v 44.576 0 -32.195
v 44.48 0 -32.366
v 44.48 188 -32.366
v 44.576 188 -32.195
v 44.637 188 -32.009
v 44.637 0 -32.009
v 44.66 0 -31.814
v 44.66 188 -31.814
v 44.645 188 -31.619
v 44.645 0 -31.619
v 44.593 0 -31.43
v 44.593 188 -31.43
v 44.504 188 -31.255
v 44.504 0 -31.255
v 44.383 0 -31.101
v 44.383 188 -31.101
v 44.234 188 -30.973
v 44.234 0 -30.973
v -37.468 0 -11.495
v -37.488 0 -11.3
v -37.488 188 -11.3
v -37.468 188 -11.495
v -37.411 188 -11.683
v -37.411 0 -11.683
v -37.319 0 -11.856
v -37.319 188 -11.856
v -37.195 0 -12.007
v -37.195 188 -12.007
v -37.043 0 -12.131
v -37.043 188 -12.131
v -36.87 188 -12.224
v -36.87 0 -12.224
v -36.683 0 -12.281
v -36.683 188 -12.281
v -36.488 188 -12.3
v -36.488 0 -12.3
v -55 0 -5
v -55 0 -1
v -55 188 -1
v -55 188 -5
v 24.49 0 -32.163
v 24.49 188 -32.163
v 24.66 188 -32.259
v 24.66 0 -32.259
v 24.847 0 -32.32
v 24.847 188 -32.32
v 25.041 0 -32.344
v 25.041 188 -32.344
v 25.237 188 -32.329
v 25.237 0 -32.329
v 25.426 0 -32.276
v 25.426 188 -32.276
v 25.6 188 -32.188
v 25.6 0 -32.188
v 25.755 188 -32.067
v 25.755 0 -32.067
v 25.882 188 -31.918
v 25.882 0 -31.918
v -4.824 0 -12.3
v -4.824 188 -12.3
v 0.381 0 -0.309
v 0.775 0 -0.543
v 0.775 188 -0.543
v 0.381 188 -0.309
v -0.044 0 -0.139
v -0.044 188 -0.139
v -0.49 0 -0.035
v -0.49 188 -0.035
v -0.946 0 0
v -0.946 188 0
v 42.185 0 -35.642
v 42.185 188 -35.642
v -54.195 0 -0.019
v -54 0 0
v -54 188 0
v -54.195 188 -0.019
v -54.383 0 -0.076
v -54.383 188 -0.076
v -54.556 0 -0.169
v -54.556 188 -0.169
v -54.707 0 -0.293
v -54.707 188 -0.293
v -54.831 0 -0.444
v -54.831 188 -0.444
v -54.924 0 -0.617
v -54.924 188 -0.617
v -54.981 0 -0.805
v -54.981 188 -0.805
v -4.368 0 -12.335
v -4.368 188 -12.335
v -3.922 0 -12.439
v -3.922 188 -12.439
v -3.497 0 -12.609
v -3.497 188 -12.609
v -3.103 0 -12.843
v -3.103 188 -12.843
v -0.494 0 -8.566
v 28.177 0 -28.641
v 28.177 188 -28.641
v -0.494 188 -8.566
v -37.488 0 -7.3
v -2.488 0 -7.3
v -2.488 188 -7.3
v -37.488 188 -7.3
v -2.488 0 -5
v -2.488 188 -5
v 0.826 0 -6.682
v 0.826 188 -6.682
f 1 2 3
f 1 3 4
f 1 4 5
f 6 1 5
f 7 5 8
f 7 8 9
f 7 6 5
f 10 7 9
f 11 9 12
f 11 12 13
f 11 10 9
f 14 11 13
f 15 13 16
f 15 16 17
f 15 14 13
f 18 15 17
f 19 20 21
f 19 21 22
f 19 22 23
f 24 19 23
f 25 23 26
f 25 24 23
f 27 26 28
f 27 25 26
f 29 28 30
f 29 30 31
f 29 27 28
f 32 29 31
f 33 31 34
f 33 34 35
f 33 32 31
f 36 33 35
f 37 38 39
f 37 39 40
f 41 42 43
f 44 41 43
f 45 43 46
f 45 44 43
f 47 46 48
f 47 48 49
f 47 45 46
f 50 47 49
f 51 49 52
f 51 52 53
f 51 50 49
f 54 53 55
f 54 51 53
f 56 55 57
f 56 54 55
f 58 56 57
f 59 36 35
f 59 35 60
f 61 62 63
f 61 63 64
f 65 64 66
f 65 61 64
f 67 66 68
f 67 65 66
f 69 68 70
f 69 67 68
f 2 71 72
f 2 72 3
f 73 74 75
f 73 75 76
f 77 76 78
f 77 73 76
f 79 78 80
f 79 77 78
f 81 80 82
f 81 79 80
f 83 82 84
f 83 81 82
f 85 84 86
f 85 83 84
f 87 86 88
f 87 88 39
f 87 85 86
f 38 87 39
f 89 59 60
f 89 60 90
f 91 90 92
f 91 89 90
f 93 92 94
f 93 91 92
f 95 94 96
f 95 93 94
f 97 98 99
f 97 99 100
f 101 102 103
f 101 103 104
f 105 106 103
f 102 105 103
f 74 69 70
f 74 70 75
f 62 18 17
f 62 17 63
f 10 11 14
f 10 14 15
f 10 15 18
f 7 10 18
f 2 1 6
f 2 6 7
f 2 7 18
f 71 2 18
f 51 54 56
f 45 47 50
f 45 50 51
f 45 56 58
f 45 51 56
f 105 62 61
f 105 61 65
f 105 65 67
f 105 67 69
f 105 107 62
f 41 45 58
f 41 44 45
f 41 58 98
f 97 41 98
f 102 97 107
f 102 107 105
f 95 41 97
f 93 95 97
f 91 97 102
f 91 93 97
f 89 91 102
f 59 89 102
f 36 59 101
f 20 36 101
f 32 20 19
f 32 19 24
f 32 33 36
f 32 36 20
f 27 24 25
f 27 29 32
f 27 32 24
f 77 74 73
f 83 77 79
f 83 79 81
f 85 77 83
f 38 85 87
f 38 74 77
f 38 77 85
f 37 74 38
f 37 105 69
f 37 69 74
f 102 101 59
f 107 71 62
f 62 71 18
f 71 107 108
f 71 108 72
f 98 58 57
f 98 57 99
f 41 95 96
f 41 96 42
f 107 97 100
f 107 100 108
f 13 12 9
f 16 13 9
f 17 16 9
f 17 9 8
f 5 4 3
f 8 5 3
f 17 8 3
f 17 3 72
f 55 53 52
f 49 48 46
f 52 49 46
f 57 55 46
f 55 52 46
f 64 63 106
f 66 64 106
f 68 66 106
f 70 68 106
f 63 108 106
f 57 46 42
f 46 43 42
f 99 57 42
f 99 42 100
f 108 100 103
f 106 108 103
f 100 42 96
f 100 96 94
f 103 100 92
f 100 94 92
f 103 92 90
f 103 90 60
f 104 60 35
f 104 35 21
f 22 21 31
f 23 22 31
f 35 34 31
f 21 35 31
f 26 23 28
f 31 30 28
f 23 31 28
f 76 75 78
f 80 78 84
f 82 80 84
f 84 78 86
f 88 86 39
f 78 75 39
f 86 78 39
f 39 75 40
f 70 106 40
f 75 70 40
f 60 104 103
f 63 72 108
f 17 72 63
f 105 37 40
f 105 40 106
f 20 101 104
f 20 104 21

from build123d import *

# Parameters (mm, degrees)
BOSS_EXTRUDE1_DEPTH = 188


with BuildPart() as part:
    # Sketch2 → Boss-Extrude1 (new body)
    with BuildSketch(Plane(origin=(0, 0, 0), x_dir=(1, 0, 0), z_dir=(0, 1, 0))):
        with BuildLine():
            Line((-0.945896367, 0), (-54, 0))
            ThreePointArc((-54, 0), (-54.707106781, 0.292893219), (-55, 1))
            Line((-55, 1), (-55, 5))
            Line((-55, 5), (-2.487604379, 5))
            Line((-2.487604379, 5), (-2.487604379, 7.3))
            Line((-2.487604379, 7.3), (-37.487604379, 7.3))
            Line((-37.487604379, 7.3), (-37.487604379, 11.3))
            ThreePointArc((-37.487604379, 11.3), (-37.19471116, 12.007106781), (-36.487604379, 12.3))
            Line((-36.487604379, 12.3), (-4.82407147, 12.3))
            ThreePointArc((-4.82407147, 12.3), (-3.921954071, 12.438849148), (-3.103342161, 12.842543867))
            Line((-3.103342161, 12.842543867), (24.489595683, 32.163326947))
            ThreePointArc((24.489595683, 32.163326947), (25.236820297, 32.328982656), (25.882324164, 31.917751339))
            Line((25.882324164, 31.917751339), (28.176629909, 28.641143162))
            Line((28.176629909, 28.641143162), (-0.493691641, 8.56596789))
            Line((-0.493691641, 8.56596789), (0.825534163, 6.681918188))
            Line((0.825534163, 6.681918188), (42.185480254, 35.642464221))
            Line((42.185480254, 35.642464221), (44.479786, 32.365856044))
            ThreePointArc((44.479786, 32.365856044), (44.645441708, 31.61863143), (44.234210392, 30.973127563))
            Line((44.234210392, 30.973127563), (0.774832942, 0.542543867))
            ThreePointArc((0.774832942, 0.542543867), (-0.043778968, 0.138849148), (-0.945896367, 0))
        make_face()
    extrude(amount=BOSS_EXTRUDE1_DEPTH)


solid = part.part
